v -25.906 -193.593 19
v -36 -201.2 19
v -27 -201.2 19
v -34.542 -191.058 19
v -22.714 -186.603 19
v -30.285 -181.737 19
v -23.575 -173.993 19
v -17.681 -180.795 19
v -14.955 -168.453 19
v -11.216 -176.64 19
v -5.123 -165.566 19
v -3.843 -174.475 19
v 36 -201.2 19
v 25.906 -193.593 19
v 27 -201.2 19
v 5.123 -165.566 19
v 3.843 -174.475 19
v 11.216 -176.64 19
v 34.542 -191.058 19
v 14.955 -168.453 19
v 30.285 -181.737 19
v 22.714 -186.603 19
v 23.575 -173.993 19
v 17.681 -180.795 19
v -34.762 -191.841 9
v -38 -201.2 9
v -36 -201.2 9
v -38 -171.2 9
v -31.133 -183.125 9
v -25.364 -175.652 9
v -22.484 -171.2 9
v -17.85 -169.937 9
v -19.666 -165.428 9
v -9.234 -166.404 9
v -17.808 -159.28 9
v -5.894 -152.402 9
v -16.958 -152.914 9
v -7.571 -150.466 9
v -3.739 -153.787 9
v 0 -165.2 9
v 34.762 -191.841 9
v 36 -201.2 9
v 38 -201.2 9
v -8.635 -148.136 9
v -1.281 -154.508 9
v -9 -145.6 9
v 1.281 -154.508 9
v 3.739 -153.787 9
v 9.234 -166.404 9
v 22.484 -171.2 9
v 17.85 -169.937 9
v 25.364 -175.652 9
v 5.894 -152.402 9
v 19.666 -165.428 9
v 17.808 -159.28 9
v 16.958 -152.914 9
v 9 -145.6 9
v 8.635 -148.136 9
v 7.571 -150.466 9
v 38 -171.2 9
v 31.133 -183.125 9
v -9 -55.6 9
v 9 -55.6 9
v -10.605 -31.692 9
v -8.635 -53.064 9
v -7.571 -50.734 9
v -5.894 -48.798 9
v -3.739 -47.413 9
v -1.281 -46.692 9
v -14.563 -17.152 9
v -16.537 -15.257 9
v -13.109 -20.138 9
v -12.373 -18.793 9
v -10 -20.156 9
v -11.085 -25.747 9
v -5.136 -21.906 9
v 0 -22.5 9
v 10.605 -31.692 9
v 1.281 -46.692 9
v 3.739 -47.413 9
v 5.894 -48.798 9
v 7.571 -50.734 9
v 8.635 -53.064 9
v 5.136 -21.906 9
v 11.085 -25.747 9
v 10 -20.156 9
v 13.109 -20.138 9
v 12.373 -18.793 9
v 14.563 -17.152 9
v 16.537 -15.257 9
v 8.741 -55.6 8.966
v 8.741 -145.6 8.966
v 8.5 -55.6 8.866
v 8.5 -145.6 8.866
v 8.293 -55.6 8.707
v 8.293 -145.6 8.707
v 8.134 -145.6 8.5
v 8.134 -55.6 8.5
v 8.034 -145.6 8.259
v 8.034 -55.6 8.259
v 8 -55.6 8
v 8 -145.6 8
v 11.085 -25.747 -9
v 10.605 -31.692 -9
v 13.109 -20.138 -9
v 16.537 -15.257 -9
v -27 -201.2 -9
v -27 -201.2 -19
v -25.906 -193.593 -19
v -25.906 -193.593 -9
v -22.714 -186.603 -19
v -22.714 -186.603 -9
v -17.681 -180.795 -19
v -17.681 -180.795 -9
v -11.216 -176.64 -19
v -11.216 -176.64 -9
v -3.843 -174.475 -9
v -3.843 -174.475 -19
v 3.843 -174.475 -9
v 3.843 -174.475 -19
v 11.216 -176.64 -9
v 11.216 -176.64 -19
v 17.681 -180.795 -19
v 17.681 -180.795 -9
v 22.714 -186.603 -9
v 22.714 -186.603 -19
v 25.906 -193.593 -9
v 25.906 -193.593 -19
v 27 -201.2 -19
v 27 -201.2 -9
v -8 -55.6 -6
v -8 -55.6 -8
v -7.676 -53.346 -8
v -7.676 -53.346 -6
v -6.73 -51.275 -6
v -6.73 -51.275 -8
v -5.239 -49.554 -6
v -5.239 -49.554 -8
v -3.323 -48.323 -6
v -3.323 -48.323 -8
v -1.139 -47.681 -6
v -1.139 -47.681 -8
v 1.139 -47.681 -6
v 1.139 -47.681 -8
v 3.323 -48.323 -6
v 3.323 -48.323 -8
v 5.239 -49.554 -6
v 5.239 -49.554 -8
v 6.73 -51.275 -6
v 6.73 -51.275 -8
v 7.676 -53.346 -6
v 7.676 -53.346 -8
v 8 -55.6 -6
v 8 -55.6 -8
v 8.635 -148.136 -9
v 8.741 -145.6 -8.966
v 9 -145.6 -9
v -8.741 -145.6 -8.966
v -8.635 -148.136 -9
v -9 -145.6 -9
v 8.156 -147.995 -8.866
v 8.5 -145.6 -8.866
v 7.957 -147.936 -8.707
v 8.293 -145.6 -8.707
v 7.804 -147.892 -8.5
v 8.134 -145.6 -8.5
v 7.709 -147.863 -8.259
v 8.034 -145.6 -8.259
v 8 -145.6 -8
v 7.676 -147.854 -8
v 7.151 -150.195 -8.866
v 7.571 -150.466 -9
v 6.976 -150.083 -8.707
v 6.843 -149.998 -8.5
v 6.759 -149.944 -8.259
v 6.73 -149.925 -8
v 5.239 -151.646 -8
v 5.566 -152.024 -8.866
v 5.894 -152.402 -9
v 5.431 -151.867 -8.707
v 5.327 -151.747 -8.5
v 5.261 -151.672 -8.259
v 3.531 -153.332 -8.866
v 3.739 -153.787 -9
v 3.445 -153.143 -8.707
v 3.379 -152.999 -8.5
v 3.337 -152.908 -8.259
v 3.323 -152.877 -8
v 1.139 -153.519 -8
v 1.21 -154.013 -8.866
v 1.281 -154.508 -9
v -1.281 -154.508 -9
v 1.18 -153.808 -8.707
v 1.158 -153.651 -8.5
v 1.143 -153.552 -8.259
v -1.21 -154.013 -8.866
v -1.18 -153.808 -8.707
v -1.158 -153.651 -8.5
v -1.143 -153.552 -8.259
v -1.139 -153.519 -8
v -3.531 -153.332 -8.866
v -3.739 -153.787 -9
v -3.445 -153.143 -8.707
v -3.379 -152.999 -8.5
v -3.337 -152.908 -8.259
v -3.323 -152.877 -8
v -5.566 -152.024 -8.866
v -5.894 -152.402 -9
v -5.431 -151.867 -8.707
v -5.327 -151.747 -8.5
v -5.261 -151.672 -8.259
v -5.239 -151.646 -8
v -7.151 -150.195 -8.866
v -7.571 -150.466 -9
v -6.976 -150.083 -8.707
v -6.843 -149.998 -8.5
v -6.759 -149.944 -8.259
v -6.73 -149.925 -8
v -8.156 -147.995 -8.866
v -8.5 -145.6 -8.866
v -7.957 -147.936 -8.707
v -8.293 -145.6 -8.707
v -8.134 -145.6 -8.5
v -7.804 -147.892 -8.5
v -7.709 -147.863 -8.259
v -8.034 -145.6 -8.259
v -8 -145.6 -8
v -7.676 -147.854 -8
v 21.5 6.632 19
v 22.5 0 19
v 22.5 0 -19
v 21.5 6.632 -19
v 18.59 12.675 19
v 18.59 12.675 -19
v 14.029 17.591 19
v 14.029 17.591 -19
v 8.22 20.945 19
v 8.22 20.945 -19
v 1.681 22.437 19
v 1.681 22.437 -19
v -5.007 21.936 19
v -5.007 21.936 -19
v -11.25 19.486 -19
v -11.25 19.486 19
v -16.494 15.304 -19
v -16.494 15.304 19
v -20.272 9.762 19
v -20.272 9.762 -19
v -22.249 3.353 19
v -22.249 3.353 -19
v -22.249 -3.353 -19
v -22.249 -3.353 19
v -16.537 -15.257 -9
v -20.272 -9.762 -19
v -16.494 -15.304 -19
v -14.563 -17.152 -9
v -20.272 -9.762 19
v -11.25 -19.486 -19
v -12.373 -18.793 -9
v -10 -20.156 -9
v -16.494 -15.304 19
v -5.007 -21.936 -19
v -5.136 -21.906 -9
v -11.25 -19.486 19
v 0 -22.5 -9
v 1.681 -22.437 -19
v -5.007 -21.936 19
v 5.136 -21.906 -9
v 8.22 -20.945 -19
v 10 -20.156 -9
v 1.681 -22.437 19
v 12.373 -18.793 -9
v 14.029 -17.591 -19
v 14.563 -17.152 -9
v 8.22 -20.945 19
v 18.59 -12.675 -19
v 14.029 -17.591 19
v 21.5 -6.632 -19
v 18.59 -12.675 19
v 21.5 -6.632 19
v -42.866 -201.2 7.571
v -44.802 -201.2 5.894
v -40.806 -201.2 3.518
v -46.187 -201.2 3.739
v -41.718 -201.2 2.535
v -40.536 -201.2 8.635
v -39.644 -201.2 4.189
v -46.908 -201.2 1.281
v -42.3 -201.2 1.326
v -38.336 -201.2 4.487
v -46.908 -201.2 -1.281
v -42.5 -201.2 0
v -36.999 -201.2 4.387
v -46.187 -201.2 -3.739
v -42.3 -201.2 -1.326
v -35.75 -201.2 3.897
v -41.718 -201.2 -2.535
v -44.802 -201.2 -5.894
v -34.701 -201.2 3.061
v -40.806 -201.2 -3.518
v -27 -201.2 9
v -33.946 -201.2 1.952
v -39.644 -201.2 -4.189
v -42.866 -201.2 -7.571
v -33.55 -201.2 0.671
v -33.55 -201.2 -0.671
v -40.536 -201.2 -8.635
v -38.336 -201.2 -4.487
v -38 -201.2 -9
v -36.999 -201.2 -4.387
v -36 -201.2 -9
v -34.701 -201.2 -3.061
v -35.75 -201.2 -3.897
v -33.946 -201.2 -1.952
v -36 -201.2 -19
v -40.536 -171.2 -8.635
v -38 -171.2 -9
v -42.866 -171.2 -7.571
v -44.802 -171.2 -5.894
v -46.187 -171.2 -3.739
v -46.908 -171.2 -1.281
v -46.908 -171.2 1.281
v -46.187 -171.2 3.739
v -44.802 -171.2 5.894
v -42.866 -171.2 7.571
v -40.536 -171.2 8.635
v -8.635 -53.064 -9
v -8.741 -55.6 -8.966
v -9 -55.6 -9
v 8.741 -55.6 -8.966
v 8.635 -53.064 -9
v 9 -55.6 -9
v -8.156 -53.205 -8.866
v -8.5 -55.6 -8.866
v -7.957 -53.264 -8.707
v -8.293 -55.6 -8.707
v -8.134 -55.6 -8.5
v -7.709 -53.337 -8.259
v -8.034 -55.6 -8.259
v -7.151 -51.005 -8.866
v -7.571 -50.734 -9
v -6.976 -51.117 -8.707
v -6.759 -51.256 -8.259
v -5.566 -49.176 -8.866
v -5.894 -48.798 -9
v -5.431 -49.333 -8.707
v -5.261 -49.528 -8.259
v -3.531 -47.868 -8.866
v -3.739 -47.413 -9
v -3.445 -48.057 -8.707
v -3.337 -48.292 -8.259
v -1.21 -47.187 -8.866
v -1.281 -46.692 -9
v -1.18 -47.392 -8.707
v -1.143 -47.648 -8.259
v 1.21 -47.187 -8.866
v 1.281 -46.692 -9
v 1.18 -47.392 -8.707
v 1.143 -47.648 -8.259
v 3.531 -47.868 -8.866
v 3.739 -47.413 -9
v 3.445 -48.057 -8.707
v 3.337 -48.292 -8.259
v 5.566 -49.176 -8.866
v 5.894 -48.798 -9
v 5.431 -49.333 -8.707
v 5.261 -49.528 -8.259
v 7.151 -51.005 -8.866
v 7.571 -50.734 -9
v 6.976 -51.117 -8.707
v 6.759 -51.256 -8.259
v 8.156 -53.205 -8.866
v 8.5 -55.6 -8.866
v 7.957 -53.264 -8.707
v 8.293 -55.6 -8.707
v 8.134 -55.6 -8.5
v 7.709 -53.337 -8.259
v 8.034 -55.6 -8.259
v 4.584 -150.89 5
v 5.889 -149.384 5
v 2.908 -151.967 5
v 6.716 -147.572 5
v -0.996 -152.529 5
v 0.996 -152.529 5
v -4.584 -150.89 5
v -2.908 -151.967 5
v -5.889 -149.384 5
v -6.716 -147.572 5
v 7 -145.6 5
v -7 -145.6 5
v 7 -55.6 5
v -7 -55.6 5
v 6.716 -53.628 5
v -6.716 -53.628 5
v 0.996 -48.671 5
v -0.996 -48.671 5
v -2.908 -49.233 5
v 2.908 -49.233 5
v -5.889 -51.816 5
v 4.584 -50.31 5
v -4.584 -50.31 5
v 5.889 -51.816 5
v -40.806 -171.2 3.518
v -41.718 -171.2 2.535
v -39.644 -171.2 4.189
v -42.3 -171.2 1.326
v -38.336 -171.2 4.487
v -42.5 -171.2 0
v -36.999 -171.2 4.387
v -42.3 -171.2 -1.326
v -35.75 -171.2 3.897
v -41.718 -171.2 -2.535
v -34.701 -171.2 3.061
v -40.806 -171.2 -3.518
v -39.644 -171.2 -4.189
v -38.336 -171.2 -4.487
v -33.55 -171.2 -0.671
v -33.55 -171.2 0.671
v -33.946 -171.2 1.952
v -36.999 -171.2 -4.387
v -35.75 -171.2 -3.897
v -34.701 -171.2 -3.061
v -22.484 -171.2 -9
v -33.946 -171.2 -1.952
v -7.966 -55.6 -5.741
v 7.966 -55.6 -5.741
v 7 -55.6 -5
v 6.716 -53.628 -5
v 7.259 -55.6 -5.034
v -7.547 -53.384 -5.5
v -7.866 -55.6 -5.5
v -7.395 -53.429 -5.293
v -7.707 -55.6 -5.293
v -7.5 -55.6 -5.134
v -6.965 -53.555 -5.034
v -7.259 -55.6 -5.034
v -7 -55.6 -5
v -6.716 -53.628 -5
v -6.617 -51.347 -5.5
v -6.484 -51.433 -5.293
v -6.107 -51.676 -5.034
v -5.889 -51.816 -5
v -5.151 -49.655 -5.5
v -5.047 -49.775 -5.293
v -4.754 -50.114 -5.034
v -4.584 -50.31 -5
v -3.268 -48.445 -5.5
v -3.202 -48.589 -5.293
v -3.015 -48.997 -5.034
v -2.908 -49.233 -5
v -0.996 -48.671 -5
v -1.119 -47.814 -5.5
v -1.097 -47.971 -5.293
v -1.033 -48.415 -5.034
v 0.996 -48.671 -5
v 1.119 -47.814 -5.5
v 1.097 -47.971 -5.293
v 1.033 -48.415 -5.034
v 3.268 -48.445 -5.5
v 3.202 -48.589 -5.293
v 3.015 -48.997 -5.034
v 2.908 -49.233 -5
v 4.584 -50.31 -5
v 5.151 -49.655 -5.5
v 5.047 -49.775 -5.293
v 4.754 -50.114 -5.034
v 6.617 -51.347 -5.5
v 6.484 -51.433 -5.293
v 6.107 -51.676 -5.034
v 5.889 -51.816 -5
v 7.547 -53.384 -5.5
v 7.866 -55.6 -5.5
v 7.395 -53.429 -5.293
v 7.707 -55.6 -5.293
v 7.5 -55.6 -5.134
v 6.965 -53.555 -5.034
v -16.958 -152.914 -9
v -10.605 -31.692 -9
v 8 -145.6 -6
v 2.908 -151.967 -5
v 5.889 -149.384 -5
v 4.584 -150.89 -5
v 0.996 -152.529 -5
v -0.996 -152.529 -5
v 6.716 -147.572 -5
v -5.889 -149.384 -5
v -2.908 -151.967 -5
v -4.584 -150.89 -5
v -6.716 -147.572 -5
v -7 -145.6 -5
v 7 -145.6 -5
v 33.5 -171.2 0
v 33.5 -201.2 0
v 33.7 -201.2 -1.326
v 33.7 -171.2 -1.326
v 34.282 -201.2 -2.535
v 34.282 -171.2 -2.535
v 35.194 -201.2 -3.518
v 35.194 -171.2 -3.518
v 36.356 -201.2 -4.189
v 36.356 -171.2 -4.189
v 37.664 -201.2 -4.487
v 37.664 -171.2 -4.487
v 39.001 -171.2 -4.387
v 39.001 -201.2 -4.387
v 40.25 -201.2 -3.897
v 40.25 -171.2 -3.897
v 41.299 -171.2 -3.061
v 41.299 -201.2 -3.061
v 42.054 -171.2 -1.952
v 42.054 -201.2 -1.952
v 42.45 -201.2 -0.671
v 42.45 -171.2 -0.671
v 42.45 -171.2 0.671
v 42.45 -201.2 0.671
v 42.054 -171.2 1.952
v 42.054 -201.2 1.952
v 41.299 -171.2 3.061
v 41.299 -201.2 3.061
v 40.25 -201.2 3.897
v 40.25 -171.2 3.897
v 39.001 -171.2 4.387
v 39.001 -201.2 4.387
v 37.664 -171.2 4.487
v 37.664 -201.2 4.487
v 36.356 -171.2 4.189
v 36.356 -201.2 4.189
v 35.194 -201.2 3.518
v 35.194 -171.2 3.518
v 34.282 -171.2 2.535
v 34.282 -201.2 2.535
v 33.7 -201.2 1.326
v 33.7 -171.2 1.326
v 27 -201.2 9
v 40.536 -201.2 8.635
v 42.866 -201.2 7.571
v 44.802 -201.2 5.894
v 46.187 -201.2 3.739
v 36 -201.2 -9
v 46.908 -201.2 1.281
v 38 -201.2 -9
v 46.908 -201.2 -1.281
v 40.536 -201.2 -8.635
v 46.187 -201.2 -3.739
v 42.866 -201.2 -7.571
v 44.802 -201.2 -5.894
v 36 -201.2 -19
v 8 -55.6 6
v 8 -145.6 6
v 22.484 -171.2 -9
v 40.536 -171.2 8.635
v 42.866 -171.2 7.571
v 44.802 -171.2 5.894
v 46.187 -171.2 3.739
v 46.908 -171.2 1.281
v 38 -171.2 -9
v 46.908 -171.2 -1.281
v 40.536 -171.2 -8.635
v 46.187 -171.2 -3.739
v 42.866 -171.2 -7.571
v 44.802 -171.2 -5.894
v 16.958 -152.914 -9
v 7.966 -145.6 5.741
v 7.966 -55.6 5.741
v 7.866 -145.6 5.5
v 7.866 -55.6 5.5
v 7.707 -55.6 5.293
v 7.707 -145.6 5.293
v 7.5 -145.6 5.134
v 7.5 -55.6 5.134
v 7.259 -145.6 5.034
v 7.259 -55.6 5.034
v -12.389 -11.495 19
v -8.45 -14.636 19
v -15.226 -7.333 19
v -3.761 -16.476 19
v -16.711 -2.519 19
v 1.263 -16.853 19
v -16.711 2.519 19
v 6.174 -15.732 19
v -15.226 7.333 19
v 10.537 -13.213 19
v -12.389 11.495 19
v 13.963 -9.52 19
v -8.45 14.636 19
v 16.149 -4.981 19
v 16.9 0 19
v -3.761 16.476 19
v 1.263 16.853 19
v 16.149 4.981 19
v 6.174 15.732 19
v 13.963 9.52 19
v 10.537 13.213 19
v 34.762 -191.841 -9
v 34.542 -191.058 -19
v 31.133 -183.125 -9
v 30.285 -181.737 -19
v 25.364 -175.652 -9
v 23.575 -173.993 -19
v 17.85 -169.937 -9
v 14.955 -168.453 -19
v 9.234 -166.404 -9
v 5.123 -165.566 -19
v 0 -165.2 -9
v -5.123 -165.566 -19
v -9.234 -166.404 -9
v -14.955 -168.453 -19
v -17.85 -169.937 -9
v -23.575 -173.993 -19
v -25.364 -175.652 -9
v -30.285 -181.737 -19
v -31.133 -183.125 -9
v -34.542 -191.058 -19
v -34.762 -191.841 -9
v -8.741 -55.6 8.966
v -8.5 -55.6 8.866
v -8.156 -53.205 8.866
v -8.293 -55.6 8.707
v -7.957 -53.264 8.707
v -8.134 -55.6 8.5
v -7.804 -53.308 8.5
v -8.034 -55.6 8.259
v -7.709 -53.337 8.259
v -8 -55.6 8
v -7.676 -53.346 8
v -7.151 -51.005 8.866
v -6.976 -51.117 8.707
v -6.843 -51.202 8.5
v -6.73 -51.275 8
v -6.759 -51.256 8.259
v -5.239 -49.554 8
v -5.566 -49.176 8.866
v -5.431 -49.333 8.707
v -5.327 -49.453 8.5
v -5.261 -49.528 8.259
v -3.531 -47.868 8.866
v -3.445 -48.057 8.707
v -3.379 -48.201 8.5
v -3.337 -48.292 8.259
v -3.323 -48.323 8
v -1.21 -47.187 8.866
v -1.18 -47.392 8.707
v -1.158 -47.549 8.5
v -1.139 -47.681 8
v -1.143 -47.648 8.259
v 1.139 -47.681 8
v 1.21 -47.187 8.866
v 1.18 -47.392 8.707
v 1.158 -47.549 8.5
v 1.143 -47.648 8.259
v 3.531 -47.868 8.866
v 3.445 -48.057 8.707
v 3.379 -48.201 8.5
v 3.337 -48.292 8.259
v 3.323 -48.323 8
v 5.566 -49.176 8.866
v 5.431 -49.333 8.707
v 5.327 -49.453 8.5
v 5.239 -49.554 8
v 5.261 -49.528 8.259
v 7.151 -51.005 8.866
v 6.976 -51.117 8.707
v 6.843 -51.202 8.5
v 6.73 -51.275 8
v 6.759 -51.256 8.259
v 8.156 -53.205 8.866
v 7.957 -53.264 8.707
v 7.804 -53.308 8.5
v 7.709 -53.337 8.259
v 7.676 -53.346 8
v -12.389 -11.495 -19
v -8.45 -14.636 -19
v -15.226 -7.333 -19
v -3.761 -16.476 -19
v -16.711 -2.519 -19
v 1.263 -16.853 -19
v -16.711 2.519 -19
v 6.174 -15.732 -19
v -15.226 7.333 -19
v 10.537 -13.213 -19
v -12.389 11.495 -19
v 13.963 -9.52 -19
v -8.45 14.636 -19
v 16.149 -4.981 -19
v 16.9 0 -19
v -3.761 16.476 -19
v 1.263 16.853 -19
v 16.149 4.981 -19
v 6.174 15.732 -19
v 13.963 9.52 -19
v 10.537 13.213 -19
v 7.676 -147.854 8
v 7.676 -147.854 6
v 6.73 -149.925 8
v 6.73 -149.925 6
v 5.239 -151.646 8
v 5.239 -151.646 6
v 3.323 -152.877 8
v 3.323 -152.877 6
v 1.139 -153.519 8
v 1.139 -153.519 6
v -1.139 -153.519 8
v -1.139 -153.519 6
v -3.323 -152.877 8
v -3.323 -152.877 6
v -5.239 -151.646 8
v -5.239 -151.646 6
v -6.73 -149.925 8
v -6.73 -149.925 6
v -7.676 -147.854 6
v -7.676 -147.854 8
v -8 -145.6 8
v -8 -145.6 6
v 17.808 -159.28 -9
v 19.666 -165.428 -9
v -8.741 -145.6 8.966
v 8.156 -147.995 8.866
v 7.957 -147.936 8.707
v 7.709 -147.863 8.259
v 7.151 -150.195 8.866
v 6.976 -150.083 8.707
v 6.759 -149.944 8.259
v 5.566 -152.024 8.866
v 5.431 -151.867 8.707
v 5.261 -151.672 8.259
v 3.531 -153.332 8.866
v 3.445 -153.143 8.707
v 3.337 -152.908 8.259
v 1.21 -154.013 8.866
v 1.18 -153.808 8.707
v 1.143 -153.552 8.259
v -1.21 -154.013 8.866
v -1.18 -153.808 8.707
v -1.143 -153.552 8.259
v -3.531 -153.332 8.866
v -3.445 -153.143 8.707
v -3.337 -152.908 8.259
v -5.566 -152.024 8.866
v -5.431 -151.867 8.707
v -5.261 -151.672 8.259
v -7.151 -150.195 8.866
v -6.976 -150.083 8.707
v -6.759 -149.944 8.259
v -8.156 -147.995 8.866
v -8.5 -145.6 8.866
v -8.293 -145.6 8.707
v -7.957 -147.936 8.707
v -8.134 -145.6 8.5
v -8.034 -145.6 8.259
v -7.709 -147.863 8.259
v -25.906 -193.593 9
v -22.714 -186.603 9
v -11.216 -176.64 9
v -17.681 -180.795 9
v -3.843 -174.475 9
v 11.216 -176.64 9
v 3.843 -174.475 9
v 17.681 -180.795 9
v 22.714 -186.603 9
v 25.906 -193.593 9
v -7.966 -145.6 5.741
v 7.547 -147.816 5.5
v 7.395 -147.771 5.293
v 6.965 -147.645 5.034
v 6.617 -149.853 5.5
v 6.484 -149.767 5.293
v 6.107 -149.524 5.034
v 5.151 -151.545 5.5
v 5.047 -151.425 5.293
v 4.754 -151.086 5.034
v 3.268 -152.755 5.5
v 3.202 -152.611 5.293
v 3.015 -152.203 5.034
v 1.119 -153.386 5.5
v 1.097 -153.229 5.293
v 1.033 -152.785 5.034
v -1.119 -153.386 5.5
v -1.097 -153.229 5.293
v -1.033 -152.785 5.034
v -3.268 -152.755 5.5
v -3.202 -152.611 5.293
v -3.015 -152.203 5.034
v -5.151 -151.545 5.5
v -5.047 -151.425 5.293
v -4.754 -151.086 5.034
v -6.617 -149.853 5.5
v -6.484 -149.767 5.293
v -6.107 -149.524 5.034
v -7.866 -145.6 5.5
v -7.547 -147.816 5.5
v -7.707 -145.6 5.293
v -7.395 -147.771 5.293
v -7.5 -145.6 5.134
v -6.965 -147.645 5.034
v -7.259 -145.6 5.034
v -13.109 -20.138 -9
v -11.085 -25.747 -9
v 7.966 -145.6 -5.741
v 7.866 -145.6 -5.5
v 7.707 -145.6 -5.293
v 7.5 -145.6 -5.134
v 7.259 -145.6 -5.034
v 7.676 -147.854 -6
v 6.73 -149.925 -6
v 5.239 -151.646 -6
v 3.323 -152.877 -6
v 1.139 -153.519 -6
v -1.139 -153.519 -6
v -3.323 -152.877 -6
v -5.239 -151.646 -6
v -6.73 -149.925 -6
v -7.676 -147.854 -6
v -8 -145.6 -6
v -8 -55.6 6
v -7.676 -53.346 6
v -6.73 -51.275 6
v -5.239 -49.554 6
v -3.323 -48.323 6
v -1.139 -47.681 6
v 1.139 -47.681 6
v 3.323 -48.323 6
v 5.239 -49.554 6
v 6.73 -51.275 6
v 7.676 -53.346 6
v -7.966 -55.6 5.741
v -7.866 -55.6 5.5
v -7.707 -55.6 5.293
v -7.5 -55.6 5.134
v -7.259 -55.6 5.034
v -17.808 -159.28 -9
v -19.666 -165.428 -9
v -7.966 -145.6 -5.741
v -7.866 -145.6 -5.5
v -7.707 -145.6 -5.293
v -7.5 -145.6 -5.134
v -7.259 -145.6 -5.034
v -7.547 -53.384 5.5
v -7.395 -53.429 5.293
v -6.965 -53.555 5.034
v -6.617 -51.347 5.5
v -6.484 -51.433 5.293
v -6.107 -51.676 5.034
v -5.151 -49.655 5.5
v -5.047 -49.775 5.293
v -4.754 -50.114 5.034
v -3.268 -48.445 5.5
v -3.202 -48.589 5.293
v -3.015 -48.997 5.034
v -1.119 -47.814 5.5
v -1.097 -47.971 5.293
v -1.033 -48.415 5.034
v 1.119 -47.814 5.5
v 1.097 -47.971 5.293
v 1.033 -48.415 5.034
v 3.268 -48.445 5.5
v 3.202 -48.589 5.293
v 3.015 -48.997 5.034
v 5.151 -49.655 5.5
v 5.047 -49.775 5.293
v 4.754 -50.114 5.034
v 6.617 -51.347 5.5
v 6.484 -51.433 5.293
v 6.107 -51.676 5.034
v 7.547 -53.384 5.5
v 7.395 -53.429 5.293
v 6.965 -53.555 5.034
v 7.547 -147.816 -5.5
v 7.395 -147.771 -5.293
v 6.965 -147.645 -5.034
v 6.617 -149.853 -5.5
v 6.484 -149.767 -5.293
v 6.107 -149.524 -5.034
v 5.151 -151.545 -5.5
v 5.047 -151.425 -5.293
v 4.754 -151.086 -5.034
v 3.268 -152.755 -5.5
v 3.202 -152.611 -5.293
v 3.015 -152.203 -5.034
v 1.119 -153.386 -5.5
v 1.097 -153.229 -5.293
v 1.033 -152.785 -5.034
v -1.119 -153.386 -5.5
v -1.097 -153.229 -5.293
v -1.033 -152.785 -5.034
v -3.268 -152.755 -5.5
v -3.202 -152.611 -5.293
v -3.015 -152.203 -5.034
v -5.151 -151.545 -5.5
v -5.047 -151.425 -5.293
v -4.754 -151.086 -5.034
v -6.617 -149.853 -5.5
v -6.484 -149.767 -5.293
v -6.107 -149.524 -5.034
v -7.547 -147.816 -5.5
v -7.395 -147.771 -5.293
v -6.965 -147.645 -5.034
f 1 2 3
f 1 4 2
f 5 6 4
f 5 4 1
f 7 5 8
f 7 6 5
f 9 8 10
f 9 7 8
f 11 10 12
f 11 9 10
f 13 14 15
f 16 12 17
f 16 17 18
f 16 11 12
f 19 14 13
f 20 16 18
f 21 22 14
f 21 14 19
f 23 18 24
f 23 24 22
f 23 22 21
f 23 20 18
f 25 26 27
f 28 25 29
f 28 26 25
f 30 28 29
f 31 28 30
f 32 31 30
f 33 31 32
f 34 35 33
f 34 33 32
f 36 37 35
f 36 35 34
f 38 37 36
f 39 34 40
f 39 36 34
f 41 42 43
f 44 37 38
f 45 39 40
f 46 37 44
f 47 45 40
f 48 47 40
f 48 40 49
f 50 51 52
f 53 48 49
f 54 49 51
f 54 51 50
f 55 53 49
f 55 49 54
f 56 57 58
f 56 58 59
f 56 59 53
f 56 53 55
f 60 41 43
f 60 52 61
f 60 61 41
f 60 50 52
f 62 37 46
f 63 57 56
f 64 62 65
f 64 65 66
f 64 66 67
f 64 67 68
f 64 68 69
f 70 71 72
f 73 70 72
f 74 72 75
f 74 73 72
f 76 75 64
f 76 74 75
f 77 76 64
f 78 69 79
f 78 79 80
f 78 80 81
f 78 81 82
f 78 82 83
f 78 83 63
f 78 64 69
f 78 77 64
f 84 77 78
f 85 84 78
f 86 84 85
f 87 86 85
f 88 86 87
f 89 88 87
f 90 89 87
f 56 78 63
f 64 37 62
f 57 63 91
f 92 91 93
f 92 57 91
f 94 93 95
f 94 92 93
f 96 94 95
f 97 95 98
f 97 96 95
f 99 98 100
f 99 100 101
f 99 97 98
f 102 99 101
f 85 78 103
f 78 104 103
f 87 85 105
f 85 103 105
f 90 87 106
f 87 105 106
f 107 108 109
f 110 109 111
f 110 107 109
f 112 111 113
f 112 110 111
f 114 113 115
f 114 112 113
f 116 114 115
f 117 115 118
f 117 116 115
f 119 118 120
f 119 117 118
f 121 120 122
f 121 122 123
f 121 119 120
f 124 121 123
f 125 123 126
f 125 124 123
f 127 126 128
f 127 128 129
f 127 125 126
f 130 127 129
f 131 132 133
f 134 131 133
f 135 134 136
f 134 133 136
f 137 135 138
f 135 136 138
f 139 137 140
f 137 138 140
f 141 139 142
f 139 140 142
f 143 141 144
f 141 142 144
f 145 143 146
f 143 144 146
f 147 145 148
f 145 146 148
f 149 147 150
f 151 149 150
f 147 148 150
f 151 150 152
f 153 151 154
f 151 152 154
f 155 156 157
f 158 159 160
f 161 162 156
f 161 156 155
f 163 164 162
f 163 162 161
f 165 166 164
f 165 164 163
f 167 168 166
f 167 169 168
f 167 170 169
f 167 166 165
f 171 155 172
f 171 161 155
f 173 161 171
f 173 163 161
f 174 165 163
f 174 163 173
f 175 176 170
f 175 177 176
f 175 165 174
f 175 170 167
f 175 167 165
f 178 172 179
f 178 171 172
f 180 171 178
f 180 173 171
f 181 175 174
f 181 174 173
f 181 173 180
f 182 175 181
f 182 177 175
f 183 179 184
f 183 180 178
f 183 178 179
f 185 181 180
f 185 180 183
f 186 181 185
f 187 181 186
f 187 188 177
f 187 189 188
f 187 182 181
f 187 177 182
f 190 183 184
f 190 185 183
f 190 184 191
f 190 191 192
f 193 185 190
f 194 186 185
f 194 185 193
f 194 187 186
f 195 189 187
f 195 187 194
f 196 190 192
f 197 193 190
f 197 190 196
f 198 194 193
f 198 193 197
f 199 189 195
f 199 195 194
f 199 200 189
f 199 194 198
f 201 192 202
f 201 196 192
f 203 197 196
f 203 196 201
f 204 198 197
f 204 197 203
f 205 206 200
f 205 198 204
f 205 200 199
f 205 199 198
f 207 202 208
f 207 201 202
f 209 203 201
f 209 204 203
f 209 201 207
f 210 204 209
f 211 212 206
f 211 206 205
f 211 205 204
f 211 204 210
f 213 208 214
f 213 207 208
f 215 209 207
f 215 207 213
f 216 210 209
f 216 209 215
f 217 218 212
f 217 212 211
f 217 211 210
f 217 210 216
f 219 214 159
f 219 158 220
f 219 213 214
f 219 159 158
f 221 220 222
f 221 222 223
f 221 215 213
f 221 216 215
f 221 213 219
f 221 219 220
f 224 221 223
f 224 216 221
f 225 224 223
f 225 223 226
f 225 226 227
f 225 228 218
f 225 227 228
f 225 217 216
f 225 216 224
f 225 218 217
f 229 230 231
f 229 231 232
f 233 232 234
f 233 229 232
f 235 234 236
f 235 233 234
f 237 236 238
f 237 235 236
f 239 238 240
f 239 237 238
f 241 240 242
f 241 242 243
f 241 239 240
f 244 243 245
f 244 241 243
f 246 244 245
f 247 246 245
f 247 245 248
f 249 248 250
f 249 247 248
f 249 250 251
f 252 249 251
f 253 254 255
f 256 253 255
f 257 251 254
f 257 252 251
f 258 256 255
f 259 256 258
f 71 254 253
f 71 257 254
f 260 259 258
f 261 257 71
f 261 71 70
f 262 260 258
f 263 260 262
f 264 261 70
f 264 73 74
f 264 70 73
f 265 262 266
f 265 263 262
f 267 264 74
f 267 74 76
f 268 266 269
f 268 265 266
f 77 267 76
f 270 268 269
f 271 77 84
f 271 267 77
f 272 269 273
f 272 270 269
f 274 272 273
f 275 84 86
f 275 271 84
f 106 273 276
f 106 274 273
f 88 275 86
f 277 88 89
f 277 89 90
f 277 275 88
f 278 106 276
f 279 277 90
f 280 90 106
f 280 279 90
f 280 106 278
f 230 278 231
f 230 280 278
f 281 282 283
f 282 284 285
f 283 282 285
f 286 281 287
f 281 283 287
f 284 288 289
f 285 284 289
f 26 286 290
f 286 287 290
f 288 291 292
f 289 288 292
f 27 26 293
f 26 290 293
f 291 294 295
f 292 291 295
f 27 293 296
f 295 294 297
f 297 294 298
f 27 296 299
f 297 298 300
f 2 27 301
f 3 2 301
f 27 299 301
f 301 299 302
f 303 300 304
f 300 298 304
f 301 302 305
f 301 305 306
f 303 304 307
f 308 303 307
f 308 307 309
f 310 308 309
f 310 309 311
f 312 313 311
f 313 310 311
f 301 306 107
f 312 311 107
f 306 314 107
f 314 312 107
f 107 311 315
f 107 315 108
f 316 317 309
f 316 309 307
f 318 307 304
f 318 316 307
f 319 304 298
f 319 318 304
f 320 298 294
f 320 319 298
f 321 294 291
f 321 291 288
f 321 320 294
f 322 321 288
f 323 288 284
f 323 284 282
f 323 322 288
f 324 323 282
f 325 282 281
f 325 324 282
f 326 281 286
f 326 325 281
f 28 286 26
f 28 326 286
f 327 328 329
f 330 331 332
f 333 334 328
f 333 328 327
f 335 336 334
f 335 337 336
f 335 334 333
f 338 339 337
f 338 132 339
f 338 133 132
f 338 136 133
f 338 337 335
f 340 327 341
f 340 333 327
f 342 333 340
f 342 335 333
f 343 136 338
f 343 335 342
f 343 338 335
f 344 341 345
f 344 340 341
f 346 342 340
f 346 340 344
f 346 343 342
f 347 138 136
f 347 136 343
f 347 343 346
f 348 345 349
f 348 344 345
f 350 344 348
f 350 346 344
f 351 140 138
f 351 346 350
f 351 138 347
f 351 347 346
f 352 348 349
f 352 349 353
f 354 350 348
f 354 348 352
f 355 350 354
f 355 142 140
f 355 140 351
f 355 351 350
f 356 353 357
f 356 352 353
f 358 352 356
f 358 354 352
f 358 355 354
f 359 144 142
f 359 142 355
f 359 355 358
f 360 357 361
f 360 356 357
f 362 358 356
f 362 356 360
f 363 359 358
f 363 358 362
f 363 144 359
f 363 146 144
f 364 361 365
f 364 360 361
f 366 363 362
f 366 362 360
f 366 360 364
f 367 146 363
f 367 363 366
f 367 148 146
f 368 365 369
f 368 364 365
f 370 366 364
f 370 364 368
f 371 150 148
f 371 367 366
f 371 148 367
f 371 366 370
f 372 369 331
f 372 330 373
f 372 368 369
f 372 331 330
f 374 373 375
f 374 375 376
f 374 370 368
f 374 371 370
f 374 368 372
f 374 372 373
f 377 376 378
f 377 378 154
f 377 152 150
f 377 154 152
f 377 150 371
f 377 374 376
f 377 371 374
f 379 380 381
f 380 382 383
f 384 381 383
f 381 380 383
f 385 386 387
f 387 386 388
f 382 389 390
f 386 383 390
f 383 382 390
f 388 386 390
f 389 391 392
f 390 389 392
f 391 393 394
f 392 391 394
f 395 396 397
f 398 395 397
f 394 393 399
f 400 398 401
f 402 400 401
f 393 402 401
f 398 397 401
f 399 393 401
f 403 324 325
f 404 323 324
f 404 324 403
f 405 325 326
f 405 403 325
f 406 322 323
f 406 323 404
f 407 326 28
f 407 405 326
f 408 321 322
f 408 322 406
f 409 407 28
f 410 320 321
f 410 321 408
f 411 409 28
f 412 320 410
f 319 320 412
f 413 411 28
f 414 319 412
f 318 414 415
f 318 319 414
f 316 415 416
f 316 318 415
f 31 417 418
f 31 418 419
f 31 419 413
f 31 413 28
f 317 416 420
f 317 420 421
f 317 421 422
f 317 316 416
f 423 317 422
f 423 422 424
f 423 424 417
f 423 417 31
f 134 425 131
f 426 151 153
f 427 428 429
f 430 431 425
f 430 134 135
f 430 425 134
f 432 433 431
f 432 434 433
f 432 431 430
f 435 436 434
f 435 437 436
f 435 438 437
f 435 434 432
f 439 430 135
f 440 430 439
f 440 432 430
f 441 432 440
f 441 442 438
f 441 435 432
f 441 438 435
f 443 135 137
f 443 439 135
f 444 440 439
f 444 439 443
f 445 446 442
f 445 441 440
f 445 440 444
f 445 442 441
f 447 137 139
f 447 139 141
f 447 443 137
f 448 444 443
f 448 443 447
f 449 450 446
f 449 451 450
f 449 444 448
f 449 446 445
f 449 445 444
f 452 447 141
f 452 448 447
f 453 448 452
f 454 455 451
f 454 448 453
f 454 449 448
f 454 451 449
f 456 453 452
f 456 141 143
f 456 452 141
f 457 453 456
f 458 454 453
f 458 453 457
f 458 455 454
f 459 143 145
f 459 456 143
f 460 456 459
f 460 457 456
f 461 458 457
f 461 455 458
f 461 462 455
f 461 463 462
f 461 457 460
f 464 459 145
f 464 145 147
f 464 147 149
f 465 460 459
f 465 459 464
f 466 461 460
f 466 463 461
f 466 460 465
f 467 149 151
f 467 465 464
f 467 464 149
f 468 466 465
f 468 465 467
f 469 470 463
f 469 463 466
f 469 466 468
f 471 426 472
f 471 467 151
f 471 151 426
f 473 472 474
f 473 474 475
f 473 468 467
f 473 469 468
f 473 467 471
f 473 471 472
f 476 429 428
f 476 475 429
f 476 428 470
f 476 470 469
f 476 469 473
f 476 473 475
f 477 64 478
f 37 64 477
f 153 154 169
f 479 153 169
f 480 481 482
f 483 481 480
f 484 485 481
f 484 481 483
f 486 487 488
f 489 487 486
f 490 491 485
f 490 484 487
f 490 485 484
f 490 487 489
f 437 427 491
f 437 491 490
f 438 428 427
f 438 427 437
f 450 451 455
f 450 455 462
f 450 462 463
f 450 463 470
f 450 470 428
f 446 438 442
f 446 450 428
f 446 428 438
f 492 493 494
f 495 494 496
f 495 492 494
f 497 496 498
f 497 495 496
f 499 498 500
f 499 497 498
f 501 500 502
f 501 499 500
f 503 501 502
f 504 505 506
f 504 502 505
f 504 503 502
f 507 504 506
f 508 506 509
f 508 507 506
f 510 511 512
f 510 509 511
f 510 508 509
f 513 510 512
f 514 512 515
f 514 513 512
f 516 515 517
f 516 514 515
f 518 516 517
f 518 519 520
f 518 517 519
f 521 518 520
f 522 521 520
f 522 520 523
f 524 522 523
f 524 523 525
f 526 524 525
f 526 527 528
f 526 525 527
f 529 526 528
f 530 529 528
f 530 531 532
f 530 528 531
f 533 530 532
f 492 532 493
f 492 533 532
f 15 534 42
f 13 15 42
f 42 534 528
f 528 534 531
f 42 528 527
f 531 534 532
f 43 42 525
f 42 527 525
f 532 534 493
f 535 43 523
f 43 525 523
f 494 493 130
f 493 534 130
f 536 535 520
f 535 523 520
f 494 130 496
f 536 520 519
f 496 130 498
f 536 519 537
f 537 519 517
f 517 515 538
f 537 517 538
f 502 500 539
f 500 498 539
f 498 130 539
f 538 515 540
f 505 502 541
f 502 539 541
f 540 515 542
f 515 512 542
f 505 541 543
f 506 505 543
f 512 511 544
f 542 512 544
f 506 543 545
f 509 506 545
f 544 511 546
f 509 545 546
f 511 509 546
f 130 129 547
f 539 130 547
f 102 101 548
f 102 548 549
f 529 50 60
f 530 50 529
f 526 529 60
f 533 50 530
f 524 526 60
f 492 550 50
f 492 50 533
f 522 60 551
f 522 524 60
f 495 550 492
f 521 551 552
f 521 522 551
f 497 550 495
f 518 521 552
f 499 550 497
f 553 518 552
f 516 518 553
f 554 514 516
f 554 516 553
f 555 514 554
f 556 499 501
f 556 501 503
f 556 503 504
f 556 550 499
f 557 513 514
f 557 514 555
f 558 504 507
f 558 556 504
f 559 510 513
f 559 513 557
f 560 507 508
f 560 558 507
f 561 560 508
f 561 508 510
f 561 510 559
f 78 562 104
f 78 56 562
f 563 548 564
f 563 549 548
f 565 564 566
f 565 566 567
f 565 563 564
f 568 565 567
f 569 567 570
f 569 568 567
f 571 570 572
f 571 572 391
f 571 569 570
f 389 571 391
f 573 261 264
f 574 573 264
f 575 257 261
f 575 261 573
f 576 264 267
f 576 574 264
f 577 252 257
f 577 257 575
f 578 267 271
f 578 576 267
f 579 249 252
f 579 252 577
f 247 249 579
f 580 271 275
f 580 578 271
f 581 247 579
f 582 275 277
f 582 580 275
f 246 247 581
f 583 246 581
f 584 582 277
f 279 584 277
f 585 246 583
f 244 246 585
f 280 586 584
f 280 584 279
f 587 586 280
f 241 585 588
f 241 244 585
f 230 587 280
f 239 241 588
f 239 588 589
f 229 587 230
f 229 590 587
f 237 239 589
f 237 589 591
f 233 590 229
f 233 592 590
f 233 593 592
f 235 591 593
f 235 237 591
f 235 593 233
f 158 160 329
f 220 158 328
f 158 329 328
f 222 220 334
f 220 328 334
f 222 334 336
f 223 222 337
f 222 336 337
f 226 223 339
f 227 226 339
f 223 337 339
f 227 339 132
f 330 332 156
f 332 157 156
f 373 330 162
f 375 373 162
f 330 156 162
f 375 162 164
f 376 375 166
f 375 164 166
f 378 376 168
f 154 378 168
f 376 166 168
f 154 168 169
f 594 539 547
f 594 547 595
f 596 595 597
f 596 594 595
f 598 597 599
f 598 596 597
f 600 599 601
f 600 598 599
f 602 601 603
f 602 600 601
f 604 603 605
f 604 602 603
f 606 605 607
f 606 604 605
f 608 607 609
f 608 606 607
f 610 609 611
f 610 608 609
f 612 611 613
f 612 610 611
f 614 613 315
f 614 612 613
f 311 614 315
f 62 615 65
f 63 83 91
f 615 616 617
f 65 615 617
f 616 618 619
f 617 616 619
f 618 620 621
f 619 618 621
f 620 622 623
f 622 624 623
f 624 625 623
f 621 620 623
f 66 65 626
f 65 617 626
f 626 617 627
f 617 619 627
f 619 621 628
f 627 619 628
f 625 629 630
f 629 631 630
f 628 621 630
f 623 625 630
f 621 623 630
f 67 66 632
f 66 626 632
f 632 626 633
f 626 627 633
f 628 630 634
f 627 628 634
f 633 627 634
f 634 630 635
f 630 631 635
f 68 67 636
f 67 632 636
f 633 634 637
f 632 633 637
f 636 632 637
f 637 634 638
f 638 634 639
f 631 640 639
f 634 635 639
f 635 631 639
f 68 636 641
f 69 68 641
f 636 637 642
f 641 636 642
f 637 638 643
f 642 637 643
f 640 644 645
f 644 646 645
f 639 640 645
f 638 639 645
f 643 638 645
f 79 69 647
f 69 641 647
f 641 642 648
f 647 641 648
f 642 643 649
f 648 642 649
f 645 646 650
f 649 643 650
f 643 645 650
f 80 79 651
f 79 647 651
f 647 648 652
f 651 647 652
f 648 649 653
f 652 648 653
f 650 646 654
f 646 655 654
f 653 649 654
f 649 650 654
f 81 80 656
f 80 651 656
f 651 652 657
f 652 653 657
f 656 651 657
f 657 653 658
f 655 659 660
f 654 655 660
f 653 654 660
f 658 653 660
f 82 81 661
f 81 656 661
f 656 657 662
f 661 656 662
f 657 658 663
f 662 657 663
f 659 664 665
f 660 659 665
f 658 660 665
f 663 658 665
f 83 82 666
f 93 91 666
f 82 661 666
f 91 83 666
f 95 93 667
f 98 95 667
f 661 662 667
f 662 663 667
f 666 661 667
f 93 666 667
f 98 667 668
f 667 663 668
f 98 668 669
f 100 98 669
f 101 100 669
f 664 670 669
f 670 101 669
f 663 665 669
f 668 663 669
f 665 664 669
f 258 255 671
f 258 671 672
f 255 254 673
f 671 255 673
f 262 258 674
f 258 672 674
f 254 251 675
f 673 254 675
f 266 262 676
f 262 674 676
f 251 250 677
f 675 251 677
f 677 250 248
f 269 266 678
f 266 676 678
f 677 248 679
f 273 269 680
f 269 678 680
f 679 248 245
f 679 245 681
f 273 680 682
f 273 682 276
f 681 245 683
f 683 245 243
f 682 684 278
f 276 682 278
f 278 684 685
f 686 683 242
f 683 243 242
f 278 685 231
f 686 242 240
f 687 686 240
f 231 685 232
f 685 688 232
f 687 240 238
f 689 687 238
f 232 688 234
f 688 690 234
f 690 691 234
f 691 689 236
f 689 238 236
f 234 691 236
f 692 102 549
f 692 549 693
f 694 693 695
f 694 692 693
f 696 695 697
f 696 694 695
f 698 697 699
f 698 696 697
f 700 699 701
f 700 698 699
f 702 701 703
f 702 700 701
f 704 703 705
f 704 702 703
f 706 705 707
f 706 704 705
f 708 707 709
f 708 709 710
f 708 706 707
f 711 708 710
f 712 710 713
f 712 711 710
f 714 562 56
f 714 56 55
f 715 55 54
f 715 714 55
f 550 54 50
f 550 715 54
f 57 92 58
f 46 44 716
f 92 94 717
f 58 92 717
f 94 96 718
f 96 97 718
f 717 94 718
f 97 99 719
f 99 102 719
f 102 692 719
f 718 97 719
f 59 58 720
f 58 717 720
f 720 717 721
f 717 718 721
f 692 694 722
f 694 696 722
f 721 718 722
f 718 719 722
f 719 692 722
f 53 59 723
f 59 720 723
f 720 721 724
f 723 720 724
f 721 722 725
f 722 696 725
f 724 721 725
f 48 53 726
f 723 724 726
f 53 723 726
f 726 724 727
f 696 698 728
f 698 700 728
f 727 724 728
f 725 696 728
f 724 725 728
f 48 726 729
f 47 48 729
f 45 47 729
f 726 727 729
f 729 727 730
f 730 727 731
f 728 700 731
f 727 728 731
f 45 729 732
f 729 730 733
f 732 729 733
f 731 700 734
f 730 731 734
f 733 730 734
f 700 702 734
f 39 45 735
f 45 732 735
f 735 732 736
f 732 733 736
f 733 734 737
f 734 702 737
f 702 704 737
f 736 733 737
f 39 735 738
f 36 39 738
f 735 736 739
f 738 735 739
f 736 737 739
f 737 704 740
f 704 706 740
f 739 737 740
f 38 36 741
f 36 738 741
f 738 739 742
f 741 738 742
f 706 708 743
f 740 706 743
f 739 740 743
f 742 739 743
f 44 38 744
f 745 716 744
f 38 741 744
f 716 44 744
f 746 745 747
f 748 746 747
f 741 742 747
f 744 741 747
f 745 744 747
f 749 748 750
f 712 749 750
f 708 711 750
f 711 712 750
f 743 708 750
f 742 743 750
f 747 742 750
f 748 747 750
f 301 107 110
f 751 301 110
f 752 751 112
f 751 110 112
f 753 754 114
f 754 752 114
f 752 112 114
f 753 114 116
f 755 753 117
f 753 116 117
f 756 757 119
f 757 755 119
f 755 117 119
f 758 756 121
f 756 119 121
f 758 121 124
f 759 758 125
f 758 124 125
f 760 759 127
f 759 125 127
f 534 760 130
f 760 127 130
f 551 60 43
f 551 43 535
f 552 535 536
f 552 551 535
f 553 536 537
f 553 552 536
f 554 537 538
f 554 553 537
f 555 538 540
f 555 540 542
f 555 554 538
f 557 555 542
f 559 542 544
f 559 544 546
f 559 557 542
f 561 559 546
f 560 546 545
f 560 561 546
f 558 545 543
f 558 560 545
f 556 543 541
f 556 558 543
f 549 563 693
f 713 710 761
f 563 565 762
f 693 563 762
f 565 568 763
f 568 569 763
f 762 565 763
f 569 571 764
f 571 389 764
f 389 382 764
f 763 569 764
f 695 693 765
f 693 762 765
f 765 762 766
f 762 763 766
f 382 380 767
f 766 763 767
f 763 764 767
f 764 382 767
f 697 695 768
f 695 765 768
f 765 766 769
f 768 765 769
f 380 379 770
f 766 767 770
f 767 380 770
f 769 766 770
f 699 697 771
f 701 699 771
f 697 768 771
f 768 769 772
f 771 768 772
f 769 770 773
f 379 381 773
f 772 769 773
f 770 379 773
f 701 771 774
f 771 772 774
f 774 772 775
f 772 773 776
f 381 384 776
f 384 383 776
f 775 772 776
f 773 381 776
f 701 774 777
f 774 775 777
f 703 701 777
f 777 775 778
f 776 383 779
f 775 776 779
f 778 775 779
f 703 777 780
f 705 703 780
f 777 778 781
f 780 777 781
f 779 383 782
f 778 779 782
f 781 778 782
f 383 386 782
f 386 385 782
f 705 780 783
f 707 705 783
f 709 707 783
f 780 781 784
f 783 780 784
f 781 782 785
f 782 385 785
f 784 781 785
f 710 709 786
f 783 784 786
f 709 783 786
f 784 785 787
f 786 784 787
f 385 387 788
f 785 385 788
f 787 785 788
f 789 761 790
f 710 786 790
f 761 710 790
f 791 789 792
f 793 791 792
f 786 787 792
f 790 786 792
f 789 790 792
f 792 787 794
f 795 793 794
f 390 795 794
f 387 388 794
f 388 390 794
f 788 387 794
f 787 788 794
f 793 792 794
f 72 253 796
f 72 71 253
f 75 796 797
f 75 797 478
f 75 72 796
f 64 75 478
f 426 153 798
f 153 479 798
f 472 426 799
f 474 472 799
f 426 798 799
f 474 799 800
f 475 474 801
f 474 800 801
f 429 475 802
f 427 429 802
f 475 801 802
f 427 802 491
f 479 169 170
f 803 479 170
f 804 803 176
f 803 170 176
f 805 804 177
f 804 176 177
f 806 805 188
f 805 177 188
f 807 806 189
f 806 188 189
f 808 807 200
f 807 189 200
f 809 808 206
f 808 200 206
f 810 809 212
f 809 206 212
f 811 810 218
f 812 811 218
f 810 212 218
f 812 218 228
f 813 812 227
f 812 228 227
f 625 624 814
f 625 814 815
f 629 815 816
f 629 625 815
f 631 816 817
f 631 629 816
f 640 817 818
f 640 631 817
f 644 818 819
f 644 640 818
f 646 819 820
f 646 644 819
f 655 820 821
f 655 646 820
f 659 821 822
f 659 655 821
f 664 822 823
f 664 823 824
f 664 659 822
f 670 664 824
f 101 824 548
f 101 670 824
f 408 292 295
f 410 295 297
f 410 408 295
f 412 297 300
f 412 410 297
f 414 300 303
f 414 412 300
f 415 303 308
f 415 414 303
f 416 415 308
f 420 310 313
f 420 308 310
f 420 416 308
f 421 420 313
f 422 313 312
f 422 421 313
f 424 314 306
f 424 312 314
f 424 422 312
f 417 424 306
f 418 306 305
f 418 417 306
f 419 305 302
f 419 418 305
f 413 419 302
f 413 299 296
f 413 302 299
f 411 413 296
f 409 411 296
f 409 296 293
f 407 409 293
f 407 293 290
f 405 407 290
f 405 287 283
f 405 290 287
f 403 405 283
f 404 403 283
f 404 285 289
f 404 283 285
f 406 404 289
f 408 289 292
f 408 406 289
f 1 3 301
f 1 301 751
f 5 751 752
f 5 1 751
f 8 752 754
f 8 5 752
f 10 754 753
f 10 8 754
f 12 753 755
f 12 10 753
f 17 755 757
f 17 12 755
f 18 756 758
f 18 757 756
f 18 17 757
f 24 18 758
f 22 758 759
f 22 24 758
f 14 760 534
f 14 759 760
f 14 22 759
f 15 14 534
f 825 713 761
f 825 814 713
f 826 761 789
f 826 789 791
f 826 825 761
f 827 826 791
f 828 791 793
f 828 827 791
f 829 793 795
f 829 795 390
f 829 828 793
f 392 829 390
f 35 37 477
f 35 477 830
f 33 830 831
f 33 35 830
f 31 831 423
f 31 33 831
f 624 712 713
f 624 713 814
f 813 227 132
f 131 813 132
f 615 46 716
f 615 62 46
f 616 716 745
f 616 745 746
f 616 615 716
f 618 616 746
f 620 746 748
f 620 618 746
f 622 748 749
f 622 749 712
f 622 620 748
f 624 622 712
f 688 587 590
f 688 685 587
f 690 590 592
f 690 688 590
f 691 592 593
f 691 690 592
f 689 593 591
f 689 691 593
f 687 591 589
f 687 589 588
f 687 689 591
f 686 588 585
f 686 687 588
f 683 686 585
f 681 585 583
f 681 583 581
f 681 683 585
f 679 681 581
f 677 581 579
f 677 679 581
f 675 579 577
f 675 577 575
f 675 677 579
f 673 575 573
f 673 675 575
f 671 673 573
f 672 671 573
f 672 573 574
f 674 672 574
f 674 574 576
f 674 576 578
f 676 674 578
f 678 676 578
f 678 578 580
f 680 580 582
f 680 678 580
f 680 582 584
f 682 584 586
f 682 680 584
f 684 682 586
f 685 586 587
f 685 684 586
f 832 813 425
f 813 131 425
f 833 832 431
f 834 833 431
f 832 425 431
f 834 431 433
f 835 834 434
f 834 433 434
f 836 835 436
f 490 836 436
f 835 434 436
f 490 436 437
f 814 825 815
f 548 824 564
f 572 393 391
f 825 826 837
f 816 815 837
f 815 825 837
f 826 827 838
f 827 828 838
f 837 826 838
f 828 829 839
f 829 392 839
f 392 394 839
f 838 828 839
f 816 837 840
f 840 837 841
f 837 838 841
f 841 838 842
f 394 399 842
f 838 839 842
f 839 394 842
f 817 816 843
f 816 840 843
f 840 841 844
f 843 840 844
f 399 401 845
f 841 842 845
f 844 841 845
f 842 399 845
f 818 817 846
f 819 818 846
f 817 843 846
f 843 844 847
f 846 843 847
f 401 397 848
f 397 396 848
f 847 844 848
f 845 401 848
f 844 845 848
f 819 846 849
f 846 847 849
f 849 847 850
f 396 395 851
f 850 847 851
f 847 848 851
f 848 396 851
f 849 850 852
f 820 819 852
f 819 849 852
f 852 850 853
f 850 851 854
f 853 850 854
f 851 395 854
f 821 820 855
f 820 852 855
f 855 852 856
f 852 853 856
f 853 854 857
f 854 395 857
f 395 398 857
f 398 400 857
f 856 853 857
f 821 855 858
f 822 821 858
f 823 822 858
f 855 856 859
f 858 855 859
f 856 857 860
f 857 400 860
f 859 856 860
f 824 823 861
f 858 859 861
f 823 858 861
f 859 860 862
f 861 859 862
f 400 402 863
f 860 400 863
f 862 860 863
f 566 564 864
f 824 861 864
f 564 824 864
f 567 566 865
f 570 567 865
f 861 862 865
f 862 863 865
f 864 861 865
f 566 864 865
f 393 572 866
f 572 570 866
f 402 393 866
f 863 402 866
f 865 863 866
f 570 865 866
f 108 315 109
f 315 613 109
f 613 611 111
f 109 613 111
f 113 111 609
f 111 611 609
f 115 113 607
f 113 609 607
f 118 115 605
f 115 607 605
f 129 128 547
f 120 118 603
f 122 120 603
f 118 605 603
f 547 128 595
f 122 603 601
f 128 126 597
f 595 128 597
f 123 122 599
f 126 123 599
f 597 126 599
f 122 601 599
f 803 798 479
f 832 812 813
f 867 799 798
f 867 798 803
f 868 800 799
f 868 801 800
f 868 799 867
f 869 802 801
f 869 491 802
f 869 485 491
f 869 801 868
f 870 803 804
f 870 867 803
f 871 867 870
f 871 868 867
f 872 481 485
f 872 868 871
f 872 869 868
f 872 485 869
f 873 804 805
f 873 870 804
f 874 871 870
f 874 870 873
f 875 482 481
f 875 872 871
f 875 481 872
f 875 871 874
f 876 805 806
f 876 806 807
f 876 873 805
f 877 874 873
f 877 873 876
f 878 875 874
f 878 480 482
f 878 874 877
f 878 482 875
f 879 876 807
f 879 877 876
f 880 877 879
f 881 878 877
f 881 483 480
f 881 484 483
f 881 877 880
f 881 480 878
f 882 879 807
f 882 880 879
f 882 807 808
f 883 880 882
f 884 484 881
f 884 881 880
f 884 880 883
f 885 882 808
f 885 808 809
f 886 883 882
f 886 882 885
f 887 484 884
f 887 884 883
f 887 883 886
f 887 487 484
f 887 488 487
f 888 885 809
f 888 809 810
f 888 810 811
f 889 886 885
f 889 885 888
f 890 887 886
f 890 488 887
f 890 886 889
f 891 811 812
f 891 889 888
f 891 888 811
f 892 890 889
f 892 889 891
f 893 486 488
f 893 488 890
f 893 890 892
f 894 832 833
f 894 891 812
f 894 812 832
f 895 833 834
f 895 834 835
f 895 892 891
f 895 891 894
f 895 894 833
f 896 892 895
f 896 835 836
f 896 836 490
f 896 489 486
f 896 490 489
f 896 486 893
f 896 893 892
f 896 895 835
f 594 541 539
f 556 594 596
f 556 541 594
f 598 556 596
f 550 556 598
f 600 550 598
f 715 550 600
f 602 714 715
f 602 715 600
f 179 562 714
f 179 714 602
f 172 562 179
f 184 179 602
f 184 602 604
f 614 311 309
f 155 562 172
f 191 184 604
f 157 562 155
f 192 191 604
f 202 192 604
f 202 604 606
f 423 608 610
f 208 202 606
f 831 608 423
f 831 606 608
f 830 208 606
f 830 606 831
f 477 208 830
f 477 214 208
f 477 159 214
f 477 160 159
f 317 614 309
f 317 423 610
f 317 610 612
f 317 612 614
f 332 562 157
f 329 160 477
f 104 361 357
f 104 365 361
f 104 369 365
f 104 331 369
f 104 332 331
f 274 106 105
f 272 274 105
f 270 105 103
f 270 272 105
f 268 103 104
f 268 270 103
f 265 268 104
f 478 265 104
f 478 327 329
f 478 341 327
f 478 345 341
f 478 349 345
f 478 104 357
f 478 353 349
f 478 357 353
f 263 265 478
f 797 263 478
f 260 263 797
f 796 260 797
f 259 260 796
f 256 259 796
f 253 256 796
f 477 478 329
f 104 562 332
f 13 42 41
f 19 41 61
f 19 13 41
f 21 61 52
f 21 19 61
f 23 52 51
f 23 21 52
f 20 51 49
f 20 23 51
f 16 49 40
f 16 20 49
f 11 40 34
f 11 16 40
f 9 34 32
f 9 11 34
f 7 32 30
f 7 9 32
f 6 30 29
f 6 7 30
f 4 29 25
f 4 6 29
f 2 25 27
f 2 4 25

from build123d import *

# Parameters (mm, degrees)
SKETCH1_R             = 22.5
SKETCH1_R_2           = 16.9
BOSS_EXTRUDE1_DEPTH   = 19
BOSS_EXTRUDE1_2_DEPTH = 19
BOSS_EXTRUDE2_DEPTH   = 9
CUT_EXTRUDE1_DEPTH    = 4
FILLET1_R             = 1
FILLET2_R             = 40
FILLET3_R             = 22.5
BOSS_EXTRUDE5_DEPTH   = 30
SKETCH6_R             = 27
CUT_EXTRUDE2_DEPTH    = 37
SKETCH7_R             = 4.5
CUT_EXTRUDE3_DEPTH    = 37


with BuildPart() as part:
    # Sketch1 → Boss-Extrude1 (new body, symmetric)
    with BuildSketch(Plane.XY):
        Circle(SKETCH1_R)
        Circle(SKETCH1_R_2, mode=Mode.SUBTRACT)
    extrude(amount=BOSS_EXTRUDE1_DEPTH, both=True)



with BuildPart() as body_2:
    # Sketch1 → Boss-Extrude1 2 (new body, symmetric)
    with BuildSketch(Plane.XY):
        with BuildLine():
            Line((-36, -201.2), (-27, -201.2))
            ThreePointArc((-27, -201.2), (0, -174.2), (27, -201.2))
            Line((27, -201.2), (36, -201.2))
            ThreePointArc((36, -201.2), (0, -165.2), (-36, -201.2))
        make_face()
    extrude(amount=BOSS_EXTRUDE1_2_DEPTH, both=True)


with BuildPart() as part_1:
    add(part.part)

    add(body_2.part)  # Boss-Extrude2 merges body 2
    # Sketch1<3> → Boss-Extrude2 (add, symmetric)
    with BuildSketch(Plane.XY):
        with BuildLine():
            ThreePointArc((10, -20.155644371), (0, -22.5), (-10, -20.155644371))
            Line((-10, -20.155644371), (-17.849697213, -169.936789841))
            ThreePointArc((-17.849697213, -169.936789841), (0, -165.2), (17.849697213, -169.936789841))
            Line((17.849697213, -169.936789841), (10, -20.155644371))
        make_face()
    extrude(amount=BOSS_EXTRUDE2_DEPTH, both=True)

    # Sketch2 → Cut-Extrude1 (cut)
    with BuildSketch(Plane.XY.offset(9)):
        with BuildLine():
            Line((-8, -145.6), (-8, -55.6))
            ThreePointArc((-8, -55.6), (0, -47.6), (8, -55.6))
            Line((8, -55.6), (8, -145.6))
            ThreePointArc((8, -145.6), (0, -153.6), (-8, -145.6))
        make_face()
    cut_extrude1 = extrude(amount=-CUT_EXTRUDE1_DEPTH, mode=Mode.SUBTRACT)

    # Mirror1: Cut-Extrude1 across plane
    add(cut_extrude1.mirror(Plane.XY), mode=Mode.SUBTRACT)

    # Fillet1
    fillet1_edges = [part_1.edges().sort_by_distance(p)[0] for p in [
        (8, -100.6, 5),
        (0, -153.6, 5),
        (-8, -100.6, 9),
        (0, -47.6, 5),
        (-8, -100.6, 5),
        (8, -100.6, 9),
        (0, -47.6, 9),
        (0, -153.6, 9),
        (8, -100.6, -9),
        (0, -47.6, -9),
        (-8, -100.6, -5),
        (0, -153.6, -9),
        (8, -100.6, -5),
        (0, -47.6, -5),
        (0, -153.6, -5),
        (-8, -100.6, -9),
    ]]
    fillet(fillet1_edges, radius=FILLET1_R)

    # Fillet2
    fillet2_edges = [part_1.edges().sort_by_distance(p)[0] for p in [
        (-17.849697213, -169.936789841, 0),
        (17.849697213, -169.936789841, 0),
    ]]
    fillet(fillet2_edges, radius=FILLET2_R)

    # Fillet3
    fillet3_edges = [part_1.edges().sort_by_distance(p)[0] for p in [
        (10, -20.155644371, 0),
        (-10, -20.155644371, 0),
    ]]
    fillet(fillet3_edges, radius=FILLET3_R)

    # Sketch3 → Boss-Extrude5 (add)
    with BuildSketch(Plane(origin=(0, -171.2, 0), x_dir=(-1, 0, 0), z_dir=(0, -1, 0))):
        with BuildLine():
            Line((38, -9), (-38, -9))
            ThreePointArc((-38, -9), (-47, 0), (-38, 9))
            Line((-38, 9), (38, 9))
            ThreePointArc((38, 9), (47, 0), (38, -9))
        make_face()
    extrude(amount=BOSS_EXTRUDE5_DEPTH)

    # Sketch6 → Cut-Extrude2 (cut)
    with BuildSketch(Plane(origin=(0, 0, -9), x_dir=(-1, 0, 0), z_dir=(0, 0, -1))):
        with Locations((0, -201.2)):
            Circle(SKETCH6_R)
    extrude(amount=-CUT_EXTRUDE2_DEPTH, mode=Mode.SUBTRACT)

    # Sketch7 → Cut-Extrude3 (cut)
    with BuildSketch(Plane(origin=(0, -171.2, 0), x_dir=(-1, 0, 0), z_dir=(0, -1, 0))):
        with Locations((-38, 0)):
            Circle(SKETCH7_R)
        with Locations((38, 0)):
            Circle(SKETCH7_R)
    extrude(amount=CUT_EXTRUDE3_DEPTH, mode=Mode.SUBTRACT)


solid = part_1.part
